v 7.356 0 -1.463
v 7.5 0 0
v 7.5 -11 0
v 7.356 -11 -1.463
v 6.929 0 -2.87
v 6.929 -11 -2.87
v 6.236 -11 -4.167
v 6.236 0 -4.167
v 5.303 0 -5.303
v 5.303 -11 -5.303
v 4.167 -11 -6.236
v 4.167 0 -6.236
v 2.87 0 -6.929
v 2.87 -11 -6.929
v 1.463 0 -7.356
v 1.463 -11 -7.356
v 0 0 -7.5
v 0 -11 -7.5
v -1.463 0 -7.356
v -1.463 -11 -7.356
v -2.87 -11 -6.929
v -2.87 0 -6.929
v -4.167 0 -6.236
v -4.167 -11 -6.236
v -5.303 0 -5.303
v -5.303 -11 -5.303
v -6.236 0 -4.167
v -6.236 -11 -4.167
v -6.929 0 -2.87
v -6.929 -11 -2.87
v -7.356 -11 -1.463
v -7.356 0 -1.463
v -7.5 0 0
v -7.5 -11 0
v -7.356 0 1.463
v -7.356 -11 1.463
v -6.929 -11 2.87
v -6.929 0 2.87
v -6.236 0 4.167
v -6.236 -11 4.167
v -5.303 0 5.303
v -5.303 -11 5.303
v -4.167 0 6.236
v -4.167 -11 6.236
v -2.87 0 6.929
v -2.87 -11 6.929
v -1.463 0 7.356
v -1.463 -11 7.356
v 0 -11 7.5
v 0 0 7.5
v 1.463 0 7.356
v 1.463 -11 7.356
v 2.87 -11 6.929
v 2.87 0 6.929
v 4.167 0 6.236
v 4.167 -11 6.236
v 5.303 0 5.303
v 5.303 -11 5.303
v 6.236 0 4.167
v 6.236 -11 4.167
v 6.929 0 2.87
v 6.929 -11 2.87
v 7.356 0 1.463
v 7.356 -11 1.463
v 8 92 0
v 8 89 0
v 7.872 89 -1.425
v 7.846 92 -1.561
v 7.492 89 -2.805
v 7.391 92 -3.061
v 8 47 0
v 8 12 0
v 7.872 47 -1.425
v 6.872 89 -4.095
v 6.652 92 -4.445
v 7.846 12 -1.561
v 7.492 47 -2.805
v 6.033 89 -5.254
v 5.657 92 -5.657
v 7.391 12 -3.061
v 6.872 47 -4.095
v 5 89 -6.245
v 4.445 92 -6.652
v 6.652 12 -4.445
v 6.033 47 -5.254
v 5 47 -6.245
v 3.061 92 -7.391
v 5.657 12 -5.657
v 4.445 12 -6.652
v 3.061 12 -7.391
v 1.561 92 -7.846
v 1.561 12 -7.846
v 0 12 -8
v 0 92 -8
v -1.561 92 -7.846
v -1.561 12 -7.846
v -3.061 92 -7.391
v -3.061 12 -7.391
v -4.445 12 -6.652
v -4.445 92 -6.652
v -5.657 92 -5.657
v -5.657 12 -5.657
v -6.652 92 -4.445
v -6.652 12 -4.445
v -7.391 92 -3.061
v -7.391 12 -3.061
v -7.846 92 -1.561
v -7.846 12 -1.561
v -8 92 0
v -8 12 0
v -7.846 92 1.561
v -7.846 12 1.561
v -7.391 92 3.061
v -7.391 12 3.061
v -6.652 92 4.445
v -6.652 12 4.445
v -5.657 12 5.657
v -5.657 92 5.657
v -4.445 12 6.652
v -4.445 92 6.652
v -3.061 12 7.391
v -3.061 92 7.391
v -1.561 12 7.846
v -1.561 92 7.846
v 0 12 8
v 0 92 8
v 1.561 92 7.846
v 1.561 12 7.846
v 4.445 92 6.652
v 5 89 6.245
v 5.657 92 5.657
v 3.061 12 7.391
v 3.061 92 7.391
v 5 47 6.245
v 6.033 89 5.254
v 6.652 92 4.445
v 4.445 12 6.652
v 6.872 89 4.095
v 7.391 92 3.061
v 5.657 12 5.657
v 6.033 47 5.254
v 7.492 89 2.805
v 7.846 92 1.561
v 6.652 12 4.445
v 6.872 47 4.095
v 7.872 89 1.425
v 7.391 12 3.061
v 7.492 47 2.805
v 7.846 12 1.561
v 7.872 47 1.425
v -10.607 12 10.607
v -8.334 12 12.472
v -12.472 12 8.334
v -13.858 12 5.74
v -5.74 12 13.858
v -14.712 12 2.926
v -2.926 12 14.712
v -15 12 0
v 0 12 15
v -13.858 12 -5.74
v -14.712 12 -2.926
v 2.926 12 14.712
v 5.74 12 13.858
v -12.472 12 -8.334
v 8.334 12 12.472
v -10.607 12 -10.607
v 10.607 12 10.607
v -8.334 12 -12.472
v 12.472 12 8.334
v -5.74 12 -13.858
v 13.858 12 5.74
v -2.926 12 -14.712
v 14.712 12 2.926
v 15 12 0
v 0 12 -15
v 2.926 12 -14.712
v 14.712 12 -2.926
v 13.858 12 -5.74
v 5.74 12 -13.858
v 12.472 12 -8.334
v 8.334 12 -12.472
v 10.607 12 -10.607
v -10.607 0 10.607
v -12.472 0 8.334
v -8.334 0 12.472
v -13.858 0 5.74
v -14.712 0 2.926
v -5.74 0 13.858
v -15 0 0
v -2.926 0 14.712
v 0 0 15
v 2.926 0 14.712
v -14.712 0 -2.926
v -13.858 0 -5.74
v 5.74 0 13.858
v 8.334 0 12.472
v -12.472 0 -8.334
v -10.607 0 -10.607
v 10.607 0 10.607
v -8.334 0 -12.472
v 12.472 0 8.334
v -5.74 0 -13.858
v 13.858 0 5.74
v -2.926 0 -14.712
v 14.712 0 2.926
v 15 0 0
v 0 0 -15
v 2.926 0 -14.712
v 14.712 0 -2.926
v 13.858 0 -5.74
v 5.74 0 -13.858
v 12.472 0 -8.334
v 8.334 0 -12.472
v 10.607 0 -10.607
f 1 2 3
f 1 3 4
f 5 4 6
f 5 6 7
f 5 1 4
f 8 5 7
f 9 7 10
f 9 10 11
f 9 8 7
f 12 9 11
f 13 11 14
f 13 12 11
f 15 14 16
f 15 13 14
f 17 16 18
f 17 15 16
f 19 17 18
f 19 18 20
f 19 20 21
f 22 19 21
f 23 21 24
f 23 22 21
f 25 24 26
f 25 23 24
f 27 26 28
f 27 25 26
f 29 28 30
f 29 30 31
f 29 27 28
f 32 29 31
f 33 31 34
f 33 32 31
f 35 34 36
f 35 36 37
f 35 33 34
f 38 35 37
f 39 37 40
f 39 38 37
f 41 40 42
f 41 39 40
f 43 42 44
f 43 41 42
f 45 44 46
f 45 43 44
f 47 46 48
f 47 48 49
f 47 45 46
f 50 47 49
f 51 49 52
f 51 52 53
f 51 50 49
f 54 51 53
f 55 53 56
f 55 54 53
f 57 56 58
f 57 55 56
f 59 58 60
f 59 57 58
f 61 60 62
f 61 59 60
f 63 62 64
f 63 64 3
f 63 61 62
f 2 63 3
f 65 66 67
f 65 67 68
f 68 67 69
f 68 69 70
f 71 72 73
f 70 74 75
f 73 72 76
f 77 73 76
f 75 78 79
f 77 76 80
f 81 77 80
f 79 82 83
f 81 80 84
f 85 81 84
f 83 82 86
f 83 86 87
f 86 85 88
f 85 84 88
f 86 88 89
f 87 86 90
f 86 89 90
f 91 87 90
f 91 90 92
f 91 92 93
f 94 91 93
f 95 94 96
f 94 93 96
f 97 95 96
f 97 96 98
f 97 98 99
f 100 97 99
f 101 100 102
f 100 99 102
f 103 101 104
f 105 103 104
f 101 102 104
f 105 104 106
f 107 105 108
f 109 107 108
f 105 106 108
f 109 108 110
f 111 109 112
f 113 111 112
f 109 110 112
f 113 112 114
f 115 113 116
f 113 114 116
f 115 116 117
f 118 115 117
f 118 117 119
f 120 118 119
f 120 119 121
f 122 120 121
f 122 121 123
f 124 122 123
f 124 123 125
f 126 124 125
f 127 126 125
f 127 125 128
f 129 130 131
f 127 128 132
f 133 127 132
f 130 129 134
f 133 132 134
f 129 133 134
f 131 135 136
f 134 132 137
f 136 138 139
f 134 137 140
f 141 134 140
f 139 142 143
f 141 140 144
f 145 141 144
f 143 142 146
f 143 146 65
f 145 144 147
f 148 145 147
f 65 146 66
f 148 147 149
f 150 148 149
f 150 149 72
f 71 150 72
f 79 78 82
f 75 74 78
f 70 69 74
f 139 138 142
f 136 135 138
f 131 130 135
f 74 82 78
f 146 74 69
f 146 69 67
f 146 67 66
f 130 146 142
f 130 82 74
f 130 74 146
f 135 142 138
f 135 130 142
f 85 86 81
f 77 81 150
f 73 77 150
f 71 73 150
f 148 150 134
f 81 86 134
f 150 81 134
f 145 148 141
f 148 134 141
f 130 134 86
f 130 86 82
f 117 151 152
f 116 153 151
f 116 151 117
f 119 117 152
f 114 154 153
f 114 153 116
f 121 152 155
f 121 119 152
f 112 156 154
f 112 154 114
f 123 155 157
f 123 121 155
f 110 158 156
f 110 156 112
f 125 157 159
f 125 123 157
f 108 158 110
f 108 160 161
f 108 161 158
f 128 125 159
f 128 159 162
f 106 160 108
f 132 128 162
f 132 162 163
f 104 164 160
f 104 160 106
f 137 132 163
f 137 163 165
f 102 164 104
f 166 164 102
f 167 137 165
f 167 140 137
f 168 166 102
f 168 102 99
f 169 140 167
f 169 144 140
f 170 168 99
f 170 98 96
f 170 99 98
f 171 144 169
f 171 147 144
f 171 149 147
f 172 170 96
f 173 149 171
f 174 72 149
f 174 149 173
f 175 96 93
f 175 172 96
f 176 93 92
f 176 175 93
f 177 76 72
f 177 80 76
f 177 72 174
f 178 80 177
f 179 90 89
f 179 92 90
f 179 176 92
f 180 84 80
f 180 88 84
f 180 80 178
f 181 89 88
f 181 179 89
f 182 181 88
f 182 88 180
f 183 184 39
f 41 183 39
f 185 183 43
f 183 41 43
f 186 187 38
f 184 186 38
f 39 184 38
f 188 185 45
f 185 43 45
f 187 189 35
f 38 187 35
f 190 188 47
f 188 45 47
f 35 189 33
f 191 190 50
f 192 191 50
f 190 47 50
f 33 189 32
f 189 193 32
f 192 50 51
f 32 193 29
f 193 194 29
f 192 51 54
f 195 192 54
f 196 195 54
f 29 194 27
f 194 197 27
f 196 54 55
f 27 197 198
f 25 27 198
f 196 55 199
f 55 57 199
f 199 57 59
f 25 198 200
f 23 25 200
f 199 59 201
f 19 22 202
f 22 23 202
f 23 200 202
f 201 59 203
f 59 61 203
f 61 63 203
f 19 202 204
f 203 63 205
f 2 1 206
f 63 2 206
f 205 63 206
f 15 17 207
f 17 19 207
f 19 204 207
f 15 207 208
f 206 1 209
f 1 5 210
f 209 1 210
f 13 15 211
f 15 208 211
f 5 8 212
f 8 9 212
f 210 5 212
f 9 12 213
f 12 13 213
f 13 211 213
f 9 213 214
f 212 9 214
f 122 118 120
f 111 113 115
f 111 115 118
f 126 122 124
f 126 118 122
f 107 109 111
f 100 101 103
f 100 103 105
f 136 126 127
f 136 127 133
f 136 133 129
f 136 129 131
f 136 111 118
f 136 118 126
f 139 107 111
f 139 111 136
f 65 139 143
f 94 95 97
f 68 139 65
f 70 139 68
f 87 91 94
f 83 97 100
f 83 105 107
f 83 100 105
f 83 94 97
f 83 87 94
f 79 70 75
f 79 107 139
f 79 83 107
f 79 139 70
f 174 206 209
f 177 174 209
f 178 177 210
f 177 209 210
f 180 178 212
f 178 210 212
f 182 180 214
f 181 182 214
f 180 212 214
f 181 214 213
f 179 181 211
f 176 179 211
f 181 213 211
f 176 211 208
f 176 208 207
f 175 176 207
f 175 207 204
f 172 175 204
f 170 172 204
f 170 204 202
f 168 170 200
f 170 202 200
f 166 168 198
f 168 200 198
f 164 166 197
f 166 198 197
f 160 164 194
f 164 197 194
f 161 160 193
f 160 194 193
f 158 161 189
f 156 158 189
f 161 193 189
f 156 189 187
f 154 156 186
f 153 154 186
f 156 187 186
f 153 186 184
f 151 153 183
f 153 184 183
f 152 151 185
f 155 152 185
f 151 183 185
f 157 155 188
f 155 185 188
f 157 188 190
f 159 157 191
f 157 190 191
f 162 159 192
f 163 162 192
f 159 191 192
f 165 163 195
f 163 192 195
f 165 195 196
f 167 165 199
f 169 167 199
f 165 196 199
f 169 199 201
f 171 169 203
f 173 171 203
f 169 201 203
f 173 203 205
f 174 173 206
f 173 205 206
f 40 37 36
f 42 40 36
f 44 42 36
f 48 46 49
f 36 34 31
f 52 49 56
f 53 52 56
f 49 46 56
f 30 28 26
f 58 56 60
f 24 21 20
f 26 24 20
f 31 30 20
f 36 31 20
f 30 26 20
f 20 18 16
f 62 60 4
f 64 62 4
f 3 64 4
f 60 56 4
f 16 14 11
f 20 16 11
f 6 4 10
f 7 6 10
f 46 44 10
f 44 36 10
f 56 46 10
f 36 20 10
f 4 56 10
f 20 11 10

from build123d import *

# Parameters (mm, degrees)
SKETCH1_R           = 7.5
BOSS_EXTRUDE1_DEPTH = 11
SKETCH2_R           = 15
BOSS_EXTRUDE2_DEPTH = 12
SKETCH3_R           = 8
BOSS_EXTRUDE3_DEPTH = 80
SKETCH4_W           = 9.801818504
SKETCH4_H           = 42
CUT_EXTRUDE1_DEPTH  = 40


with BuildPart() as part:
    # Sketch1 → Boss-Extrude1 (new body)
    with BuildSketch(Plane(origin=(0, 0, 0), x_dir=(1, 0, 0), z_dir=(0, 1, 0))):
        Circle(SKETCH1_R)
    extrude(amount=-BOSS_EXTRUDE1_DEPTH)

    # Sketch2 → Boss-Extrude2 (add)
    with BuildSketch(Plane(origin=(0, 0, 0), x_dir=(1, 0, 0), z_dir=(0, 1, 0))):
        Circle(SKETCH2_R)
    extrude(amount=BOSS_EXTRUDE2_DEPTH)

    # Sketch3 → Boss-Extrude3 (add)
    with BuildSketch(Plane(origin=(0, 12, 0), x_dir=(1, 0, 0), z_dir=(0, 1, 0))):
        Circle(SKETCH3_R)
    extrude(amount=BOSS_EXTRUDE3_DEPTH)

    # Sketch4 → Cut-Extrude1 (cut, symmetric)
    with BuildSketch(Plane.XY):
        with Locations((9.900909252, 68)):
            Rectangle(SKETCH4_W, SKETCH4_H)
    extrude(amount=CUT_EXTRUDE1_DEPTH, both=True, mode=Mode.SUBTRACT)


solid = part.part
